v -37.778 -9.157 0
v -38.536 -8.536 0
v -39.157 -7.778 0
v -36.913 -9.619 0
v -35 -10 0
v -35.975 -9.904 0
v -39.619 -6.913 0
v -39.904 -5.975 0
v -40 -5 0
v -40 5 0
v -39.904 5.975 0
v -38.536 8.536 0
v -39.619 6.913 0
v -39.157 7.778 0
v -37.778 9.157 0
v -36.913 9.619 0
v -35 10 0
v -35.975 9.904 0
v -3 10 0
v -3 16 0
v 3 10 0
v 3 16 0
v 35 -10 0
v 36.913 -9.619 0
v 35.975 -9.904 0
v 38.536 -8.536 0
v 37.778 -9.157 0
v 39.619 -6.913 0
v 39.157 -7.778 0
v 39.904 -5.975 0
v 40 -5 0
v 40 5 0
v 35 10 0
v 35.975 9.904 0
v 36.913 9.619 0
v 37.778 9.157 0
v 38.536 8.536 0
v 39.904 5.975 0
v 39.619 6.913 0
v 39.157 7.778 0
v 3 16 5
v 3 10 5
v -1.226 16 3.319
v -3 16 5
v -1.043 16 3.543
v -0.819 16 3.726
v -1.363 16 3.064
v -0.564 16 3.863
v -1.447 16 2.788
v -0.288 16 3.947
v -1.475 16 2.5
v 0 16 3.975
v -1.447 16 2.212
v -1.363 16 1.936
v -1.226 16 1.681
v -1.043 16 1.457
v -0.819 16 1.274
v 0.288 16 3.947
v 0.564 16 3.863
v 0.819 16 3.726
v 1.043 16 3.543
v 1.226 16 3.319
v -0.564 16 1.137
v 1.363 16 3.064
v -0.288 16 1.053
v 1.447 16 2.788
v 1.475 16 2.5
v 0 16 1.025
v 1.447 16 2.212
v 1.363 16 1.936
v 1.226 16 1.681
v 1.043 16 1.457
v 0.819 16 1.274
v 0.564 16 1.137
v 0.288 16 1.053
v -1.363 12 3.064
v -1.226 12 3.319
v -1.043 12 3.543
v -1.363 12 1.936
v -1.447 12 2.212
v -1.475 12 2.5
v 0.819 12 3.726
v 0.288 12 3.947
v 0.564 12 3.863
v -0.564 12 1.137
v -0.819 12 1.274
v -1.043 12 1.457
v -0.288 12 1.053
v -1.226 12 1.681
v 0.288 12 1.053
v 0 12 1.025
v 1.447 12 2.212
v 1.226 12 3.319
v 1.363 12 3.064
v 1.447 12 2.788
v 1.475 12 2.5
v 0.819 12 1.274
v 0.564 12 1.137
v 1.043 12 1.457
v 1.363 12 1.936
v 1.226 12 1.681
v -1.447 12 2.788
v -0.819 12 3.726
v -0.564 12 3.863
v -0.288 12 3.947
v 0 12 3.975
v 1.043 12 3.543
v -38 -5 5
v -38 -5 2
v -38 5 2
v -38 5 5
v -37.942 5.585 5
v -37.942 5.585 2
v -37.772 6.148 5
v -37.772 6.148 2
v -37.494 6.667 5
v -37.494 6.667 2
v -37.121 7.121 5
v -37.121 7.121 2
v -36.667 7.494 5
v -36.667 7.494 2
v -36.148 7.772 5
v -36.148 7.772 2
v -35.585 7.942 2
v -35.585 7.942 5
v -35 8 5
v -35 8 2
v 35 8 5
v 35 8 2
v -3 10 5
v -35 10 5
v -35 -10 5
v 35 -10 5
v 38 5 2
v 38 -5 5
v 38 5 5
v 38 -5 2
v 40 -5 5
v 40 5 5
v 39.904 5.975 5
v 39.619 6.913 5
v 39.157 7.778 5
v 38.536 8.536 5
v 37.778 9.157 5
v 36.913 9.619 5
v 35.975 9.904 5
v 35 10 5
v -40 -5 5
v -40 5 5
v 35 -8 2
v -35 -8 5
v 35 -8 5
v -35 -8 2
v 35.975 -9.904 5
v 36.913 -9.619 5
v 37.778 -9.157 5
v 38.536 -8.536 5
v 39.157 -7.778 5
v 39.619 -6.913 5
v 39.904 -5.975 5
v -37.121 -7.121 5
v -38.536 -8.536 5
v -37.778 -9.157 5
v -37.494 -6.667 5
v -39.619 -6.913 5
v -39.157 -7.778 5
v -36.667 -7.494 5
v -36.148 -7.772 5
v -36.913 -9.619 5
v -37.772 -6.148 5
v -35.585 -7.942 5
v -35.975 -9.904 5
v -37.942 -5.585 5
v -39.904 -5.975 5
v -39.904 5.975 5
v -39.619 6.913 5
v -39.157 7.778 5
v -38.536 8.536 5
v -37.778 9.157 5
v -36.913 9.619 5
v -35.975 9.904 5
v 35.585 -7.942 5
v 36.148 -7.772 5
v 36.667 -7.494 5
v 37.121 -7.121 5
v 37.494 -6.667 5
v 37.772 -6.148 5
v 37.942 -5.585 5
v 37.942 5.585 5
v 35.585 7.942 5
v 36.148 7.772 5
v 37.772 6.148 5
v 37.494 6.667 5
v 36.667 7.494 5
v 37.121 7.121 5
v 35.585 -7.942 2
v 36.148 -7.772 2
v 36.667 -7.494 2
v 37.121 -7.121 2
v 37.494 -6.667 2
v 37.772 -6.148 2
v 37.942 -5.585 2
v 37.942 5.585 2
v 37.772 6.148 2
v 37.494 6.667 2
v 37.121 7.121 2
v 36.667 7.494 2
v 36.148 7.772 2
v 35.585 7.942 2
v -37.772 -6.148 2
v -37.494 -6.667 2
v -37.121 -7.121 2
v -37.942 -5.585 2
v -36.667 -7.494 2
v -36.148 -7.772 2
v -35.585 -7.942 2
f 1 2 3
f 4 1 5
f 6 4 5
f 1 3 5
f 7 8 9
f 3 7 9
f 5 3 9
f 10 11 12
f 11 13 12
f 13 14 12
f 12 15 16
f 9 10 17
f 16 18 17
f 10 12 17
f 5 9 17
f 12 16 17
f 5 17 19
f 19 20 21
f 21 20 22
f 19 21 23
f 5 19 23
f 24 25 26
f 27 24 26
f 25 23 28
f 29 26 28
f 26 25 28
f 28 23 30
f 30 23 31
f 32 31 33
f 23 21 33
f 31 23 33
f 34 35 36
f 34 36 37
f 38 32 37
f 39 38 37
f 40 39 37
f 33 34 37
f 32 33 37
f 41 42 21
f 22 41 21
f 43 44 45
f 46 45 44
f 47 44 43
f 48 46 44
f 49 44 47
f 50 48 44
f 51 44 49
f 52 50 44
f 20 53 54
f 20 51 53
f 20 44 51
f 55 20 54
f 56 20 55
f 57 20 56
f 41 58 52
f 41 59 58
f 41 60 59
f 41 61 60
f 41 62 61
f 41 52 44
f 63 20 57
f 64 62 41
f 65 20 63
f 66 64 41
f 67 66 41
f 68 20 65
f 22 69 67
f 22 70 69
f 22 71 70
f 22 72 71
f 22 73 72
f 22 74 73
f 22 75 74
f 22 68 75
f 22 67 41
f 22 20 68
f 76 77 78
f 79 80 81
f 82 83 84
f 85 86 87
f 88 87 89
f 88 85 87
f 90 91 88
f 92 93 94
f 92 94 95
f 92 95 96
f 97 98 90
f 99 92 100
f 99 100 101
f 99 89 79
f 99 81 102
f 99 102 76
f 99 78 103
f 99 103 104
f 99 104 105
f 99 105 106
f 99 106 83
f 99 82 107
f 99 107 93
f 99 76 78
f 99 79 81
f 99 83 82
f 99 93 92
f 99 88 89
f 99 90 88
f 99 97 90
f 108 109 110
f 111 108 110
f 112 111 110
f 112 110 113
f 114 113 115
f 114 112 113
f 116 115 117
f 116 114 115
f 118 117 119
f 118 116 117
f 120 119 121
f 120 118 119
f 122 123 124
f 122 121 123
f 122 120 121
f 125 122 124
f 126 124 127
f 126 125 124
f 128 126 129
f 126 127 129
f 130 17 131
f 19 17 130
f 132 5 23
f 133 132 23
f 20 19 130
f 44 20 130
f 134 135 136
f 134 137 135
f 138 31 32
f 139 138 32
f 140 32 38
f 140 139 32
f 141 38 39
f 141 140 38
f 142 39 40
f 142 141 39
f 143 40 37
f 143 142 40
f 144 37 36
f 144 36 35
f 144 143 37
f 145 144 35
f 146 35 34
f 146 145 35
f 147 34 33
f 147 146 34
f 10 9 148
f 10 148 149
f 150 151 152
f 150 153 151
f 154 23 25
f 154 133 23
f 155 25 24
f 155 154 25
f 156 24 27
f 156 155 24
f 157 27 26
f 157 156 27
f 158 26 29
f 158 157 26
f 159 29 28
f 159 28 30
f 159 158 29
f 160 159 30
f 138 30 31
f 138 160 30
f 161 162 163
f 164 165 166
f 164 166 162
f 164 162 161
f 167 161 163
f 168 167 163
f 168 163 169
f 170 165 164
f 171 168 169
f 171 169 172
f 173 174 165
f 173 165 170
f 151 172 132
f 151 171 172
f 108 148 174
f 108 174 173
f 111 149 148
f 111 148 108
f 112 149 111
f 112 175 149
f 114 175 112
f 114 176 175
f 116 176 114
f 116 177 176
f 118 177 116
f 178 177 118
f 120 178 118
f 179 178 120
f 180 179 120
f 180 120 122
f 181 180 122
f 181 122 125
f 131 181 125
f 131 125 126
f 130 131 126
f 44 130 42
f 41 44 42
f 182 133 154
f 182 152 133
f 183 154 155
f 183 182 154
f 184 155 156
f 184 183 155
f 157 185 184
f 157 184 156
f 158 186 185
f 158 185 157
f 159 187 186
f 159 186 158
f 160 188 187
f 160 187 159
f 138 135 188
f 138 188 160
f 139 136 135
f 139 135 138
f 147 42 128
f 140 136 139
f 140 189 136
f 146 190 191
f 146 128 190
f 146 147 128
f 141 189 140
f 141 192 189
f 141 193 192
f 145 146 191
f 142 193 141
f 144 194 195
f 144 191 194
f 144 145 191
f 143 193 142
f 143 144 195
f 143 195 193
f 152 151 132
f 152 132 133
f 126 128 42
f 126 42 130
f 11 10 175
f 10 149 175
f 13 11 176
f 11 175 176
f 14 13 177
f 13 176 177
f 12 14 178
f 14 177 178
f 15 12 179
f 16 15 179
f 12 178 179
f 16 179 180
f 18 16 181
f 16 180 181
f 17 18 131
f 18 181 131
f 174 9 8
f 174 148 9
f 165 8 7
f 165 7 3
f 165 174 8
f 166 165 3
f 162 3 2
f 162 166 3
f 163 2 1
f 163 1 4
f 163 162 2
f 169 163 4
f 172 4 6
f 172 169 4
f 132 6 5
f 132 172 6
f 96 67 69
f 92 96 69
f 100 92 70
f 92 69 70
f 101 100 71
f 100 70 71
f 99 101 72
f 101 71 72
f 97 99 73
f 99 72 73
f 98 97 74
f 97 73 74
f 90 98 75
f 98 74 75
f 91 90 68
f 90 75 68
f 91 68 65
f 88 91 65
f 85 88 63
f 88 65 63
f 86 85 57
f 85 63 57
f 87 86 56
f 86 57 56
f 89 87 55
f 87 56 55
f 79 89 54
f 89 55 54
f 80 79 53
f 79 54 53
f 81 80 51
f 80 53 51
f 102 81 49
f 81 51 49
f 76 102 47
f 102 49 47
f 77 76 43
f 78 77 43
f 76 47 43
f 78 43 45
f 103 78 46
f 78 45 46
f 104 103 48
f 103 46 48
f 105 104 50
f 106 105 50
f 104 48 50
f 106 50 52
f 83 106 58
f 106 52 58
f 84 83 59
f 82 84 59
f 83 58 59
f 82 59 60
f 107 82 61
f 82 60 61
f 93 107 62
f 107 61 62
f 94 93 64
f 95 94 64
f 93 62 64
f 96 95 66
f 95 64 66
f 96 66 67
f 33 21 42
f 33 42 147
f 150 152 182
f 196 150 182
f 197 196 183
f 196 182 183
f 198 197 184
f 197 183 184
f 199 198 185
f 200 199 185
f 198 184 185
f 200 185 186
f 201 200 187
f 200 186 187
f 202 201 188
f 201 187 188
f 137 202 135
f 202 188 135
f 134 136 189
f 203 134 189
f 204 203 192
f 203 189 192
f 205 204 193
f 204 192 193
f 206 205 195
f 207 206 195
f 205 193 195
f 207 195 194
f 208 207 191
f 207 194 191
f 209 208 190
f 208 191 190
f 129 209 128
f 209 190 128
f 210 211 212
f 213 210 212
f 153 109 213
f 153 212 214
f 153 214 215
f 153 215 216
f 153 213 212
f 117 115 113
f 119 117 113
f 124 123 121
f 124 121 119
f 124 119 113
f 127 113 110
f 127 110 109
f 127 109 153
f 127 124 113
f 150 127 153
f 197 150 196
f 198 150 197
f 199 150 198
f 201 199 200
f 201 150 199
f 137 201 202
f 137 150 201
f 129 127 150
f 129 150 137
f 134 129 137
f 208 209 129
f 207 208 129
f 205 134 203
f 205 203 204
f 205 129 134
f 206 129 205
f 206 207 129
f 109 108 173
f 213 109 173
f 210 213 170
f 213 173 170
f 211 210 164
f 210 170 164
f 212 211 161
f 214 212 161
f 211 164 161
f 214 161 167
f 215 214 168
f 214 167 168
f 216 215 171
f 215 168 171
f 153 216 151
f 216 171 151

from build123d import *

# Parameters (mm, degrees)
SKETCH1_W           = 80
SKETCH1_H           = 20
BOSS_EXTRUDE1_DEPTH = 5
FILLET1_R           = 5
SHELL1_T            = -2
BOSS_EXTRUDE2_DEPTH = 6
SKETCH3_R           = 1.475
CUT_EXTRUDE1_DEPTH  = 4


with BuildPart() as part:
    # Sketch1 → Boss-Extrude1 (new body)
    with BuildSketch(Plane.XY):
        Rectangle(SKETCH1_W, SKETCH1_H)
    extrude(amount=BOSS_EXTRUDE1_DEPTH)

    # Fillet1
    fillet1_edges = [part.edges().sort_by_distance(p)[0] for p in [
        (40, -10, 2.5),
        (-40, -10, 2.5),
        (-40, 10, 2.5),
        (40, 10, 2.5),
    ]]
    fillet(fillet1_edges, radius=FILLET1_R)

    # Shell1
    shell1_openings = [part.faces().sort_by_distance(p)[0] for p in [
        (0, 0, 5),
    ]]
    offset(amount=SHELL1_T, openings=shell1_openings, kind=Kind.INTERSECTION)

    # Sketch2 → Boss-Extrude2 (add)
    with BuildSketch(Plane(origin=(0, 10, 0), x_dir=(1, 0, 0), z_dir=(0, 1, 0))):
        Polygon((0, 0), (-3, 0), (-3, -5), (3, -5), (3, 0), align=None)
    extrude(amount=BOSS_EXTRUDE2_DEPTH)

    # Sketch3 → Cut-Extrude1 (cut)
    with BuildSketch(Plane(origin=(0, 16, 0), x_dir=(1, 0, 0), z_dir=(0, 1, 0))):
        with Locations((0, -2.5)):
            Circle(SKETCH3_R)
    extrude(amount=-CUT_EXTRUDE1_DEPTH, mode=Mode.SUBTRACT)


solid = part.part
